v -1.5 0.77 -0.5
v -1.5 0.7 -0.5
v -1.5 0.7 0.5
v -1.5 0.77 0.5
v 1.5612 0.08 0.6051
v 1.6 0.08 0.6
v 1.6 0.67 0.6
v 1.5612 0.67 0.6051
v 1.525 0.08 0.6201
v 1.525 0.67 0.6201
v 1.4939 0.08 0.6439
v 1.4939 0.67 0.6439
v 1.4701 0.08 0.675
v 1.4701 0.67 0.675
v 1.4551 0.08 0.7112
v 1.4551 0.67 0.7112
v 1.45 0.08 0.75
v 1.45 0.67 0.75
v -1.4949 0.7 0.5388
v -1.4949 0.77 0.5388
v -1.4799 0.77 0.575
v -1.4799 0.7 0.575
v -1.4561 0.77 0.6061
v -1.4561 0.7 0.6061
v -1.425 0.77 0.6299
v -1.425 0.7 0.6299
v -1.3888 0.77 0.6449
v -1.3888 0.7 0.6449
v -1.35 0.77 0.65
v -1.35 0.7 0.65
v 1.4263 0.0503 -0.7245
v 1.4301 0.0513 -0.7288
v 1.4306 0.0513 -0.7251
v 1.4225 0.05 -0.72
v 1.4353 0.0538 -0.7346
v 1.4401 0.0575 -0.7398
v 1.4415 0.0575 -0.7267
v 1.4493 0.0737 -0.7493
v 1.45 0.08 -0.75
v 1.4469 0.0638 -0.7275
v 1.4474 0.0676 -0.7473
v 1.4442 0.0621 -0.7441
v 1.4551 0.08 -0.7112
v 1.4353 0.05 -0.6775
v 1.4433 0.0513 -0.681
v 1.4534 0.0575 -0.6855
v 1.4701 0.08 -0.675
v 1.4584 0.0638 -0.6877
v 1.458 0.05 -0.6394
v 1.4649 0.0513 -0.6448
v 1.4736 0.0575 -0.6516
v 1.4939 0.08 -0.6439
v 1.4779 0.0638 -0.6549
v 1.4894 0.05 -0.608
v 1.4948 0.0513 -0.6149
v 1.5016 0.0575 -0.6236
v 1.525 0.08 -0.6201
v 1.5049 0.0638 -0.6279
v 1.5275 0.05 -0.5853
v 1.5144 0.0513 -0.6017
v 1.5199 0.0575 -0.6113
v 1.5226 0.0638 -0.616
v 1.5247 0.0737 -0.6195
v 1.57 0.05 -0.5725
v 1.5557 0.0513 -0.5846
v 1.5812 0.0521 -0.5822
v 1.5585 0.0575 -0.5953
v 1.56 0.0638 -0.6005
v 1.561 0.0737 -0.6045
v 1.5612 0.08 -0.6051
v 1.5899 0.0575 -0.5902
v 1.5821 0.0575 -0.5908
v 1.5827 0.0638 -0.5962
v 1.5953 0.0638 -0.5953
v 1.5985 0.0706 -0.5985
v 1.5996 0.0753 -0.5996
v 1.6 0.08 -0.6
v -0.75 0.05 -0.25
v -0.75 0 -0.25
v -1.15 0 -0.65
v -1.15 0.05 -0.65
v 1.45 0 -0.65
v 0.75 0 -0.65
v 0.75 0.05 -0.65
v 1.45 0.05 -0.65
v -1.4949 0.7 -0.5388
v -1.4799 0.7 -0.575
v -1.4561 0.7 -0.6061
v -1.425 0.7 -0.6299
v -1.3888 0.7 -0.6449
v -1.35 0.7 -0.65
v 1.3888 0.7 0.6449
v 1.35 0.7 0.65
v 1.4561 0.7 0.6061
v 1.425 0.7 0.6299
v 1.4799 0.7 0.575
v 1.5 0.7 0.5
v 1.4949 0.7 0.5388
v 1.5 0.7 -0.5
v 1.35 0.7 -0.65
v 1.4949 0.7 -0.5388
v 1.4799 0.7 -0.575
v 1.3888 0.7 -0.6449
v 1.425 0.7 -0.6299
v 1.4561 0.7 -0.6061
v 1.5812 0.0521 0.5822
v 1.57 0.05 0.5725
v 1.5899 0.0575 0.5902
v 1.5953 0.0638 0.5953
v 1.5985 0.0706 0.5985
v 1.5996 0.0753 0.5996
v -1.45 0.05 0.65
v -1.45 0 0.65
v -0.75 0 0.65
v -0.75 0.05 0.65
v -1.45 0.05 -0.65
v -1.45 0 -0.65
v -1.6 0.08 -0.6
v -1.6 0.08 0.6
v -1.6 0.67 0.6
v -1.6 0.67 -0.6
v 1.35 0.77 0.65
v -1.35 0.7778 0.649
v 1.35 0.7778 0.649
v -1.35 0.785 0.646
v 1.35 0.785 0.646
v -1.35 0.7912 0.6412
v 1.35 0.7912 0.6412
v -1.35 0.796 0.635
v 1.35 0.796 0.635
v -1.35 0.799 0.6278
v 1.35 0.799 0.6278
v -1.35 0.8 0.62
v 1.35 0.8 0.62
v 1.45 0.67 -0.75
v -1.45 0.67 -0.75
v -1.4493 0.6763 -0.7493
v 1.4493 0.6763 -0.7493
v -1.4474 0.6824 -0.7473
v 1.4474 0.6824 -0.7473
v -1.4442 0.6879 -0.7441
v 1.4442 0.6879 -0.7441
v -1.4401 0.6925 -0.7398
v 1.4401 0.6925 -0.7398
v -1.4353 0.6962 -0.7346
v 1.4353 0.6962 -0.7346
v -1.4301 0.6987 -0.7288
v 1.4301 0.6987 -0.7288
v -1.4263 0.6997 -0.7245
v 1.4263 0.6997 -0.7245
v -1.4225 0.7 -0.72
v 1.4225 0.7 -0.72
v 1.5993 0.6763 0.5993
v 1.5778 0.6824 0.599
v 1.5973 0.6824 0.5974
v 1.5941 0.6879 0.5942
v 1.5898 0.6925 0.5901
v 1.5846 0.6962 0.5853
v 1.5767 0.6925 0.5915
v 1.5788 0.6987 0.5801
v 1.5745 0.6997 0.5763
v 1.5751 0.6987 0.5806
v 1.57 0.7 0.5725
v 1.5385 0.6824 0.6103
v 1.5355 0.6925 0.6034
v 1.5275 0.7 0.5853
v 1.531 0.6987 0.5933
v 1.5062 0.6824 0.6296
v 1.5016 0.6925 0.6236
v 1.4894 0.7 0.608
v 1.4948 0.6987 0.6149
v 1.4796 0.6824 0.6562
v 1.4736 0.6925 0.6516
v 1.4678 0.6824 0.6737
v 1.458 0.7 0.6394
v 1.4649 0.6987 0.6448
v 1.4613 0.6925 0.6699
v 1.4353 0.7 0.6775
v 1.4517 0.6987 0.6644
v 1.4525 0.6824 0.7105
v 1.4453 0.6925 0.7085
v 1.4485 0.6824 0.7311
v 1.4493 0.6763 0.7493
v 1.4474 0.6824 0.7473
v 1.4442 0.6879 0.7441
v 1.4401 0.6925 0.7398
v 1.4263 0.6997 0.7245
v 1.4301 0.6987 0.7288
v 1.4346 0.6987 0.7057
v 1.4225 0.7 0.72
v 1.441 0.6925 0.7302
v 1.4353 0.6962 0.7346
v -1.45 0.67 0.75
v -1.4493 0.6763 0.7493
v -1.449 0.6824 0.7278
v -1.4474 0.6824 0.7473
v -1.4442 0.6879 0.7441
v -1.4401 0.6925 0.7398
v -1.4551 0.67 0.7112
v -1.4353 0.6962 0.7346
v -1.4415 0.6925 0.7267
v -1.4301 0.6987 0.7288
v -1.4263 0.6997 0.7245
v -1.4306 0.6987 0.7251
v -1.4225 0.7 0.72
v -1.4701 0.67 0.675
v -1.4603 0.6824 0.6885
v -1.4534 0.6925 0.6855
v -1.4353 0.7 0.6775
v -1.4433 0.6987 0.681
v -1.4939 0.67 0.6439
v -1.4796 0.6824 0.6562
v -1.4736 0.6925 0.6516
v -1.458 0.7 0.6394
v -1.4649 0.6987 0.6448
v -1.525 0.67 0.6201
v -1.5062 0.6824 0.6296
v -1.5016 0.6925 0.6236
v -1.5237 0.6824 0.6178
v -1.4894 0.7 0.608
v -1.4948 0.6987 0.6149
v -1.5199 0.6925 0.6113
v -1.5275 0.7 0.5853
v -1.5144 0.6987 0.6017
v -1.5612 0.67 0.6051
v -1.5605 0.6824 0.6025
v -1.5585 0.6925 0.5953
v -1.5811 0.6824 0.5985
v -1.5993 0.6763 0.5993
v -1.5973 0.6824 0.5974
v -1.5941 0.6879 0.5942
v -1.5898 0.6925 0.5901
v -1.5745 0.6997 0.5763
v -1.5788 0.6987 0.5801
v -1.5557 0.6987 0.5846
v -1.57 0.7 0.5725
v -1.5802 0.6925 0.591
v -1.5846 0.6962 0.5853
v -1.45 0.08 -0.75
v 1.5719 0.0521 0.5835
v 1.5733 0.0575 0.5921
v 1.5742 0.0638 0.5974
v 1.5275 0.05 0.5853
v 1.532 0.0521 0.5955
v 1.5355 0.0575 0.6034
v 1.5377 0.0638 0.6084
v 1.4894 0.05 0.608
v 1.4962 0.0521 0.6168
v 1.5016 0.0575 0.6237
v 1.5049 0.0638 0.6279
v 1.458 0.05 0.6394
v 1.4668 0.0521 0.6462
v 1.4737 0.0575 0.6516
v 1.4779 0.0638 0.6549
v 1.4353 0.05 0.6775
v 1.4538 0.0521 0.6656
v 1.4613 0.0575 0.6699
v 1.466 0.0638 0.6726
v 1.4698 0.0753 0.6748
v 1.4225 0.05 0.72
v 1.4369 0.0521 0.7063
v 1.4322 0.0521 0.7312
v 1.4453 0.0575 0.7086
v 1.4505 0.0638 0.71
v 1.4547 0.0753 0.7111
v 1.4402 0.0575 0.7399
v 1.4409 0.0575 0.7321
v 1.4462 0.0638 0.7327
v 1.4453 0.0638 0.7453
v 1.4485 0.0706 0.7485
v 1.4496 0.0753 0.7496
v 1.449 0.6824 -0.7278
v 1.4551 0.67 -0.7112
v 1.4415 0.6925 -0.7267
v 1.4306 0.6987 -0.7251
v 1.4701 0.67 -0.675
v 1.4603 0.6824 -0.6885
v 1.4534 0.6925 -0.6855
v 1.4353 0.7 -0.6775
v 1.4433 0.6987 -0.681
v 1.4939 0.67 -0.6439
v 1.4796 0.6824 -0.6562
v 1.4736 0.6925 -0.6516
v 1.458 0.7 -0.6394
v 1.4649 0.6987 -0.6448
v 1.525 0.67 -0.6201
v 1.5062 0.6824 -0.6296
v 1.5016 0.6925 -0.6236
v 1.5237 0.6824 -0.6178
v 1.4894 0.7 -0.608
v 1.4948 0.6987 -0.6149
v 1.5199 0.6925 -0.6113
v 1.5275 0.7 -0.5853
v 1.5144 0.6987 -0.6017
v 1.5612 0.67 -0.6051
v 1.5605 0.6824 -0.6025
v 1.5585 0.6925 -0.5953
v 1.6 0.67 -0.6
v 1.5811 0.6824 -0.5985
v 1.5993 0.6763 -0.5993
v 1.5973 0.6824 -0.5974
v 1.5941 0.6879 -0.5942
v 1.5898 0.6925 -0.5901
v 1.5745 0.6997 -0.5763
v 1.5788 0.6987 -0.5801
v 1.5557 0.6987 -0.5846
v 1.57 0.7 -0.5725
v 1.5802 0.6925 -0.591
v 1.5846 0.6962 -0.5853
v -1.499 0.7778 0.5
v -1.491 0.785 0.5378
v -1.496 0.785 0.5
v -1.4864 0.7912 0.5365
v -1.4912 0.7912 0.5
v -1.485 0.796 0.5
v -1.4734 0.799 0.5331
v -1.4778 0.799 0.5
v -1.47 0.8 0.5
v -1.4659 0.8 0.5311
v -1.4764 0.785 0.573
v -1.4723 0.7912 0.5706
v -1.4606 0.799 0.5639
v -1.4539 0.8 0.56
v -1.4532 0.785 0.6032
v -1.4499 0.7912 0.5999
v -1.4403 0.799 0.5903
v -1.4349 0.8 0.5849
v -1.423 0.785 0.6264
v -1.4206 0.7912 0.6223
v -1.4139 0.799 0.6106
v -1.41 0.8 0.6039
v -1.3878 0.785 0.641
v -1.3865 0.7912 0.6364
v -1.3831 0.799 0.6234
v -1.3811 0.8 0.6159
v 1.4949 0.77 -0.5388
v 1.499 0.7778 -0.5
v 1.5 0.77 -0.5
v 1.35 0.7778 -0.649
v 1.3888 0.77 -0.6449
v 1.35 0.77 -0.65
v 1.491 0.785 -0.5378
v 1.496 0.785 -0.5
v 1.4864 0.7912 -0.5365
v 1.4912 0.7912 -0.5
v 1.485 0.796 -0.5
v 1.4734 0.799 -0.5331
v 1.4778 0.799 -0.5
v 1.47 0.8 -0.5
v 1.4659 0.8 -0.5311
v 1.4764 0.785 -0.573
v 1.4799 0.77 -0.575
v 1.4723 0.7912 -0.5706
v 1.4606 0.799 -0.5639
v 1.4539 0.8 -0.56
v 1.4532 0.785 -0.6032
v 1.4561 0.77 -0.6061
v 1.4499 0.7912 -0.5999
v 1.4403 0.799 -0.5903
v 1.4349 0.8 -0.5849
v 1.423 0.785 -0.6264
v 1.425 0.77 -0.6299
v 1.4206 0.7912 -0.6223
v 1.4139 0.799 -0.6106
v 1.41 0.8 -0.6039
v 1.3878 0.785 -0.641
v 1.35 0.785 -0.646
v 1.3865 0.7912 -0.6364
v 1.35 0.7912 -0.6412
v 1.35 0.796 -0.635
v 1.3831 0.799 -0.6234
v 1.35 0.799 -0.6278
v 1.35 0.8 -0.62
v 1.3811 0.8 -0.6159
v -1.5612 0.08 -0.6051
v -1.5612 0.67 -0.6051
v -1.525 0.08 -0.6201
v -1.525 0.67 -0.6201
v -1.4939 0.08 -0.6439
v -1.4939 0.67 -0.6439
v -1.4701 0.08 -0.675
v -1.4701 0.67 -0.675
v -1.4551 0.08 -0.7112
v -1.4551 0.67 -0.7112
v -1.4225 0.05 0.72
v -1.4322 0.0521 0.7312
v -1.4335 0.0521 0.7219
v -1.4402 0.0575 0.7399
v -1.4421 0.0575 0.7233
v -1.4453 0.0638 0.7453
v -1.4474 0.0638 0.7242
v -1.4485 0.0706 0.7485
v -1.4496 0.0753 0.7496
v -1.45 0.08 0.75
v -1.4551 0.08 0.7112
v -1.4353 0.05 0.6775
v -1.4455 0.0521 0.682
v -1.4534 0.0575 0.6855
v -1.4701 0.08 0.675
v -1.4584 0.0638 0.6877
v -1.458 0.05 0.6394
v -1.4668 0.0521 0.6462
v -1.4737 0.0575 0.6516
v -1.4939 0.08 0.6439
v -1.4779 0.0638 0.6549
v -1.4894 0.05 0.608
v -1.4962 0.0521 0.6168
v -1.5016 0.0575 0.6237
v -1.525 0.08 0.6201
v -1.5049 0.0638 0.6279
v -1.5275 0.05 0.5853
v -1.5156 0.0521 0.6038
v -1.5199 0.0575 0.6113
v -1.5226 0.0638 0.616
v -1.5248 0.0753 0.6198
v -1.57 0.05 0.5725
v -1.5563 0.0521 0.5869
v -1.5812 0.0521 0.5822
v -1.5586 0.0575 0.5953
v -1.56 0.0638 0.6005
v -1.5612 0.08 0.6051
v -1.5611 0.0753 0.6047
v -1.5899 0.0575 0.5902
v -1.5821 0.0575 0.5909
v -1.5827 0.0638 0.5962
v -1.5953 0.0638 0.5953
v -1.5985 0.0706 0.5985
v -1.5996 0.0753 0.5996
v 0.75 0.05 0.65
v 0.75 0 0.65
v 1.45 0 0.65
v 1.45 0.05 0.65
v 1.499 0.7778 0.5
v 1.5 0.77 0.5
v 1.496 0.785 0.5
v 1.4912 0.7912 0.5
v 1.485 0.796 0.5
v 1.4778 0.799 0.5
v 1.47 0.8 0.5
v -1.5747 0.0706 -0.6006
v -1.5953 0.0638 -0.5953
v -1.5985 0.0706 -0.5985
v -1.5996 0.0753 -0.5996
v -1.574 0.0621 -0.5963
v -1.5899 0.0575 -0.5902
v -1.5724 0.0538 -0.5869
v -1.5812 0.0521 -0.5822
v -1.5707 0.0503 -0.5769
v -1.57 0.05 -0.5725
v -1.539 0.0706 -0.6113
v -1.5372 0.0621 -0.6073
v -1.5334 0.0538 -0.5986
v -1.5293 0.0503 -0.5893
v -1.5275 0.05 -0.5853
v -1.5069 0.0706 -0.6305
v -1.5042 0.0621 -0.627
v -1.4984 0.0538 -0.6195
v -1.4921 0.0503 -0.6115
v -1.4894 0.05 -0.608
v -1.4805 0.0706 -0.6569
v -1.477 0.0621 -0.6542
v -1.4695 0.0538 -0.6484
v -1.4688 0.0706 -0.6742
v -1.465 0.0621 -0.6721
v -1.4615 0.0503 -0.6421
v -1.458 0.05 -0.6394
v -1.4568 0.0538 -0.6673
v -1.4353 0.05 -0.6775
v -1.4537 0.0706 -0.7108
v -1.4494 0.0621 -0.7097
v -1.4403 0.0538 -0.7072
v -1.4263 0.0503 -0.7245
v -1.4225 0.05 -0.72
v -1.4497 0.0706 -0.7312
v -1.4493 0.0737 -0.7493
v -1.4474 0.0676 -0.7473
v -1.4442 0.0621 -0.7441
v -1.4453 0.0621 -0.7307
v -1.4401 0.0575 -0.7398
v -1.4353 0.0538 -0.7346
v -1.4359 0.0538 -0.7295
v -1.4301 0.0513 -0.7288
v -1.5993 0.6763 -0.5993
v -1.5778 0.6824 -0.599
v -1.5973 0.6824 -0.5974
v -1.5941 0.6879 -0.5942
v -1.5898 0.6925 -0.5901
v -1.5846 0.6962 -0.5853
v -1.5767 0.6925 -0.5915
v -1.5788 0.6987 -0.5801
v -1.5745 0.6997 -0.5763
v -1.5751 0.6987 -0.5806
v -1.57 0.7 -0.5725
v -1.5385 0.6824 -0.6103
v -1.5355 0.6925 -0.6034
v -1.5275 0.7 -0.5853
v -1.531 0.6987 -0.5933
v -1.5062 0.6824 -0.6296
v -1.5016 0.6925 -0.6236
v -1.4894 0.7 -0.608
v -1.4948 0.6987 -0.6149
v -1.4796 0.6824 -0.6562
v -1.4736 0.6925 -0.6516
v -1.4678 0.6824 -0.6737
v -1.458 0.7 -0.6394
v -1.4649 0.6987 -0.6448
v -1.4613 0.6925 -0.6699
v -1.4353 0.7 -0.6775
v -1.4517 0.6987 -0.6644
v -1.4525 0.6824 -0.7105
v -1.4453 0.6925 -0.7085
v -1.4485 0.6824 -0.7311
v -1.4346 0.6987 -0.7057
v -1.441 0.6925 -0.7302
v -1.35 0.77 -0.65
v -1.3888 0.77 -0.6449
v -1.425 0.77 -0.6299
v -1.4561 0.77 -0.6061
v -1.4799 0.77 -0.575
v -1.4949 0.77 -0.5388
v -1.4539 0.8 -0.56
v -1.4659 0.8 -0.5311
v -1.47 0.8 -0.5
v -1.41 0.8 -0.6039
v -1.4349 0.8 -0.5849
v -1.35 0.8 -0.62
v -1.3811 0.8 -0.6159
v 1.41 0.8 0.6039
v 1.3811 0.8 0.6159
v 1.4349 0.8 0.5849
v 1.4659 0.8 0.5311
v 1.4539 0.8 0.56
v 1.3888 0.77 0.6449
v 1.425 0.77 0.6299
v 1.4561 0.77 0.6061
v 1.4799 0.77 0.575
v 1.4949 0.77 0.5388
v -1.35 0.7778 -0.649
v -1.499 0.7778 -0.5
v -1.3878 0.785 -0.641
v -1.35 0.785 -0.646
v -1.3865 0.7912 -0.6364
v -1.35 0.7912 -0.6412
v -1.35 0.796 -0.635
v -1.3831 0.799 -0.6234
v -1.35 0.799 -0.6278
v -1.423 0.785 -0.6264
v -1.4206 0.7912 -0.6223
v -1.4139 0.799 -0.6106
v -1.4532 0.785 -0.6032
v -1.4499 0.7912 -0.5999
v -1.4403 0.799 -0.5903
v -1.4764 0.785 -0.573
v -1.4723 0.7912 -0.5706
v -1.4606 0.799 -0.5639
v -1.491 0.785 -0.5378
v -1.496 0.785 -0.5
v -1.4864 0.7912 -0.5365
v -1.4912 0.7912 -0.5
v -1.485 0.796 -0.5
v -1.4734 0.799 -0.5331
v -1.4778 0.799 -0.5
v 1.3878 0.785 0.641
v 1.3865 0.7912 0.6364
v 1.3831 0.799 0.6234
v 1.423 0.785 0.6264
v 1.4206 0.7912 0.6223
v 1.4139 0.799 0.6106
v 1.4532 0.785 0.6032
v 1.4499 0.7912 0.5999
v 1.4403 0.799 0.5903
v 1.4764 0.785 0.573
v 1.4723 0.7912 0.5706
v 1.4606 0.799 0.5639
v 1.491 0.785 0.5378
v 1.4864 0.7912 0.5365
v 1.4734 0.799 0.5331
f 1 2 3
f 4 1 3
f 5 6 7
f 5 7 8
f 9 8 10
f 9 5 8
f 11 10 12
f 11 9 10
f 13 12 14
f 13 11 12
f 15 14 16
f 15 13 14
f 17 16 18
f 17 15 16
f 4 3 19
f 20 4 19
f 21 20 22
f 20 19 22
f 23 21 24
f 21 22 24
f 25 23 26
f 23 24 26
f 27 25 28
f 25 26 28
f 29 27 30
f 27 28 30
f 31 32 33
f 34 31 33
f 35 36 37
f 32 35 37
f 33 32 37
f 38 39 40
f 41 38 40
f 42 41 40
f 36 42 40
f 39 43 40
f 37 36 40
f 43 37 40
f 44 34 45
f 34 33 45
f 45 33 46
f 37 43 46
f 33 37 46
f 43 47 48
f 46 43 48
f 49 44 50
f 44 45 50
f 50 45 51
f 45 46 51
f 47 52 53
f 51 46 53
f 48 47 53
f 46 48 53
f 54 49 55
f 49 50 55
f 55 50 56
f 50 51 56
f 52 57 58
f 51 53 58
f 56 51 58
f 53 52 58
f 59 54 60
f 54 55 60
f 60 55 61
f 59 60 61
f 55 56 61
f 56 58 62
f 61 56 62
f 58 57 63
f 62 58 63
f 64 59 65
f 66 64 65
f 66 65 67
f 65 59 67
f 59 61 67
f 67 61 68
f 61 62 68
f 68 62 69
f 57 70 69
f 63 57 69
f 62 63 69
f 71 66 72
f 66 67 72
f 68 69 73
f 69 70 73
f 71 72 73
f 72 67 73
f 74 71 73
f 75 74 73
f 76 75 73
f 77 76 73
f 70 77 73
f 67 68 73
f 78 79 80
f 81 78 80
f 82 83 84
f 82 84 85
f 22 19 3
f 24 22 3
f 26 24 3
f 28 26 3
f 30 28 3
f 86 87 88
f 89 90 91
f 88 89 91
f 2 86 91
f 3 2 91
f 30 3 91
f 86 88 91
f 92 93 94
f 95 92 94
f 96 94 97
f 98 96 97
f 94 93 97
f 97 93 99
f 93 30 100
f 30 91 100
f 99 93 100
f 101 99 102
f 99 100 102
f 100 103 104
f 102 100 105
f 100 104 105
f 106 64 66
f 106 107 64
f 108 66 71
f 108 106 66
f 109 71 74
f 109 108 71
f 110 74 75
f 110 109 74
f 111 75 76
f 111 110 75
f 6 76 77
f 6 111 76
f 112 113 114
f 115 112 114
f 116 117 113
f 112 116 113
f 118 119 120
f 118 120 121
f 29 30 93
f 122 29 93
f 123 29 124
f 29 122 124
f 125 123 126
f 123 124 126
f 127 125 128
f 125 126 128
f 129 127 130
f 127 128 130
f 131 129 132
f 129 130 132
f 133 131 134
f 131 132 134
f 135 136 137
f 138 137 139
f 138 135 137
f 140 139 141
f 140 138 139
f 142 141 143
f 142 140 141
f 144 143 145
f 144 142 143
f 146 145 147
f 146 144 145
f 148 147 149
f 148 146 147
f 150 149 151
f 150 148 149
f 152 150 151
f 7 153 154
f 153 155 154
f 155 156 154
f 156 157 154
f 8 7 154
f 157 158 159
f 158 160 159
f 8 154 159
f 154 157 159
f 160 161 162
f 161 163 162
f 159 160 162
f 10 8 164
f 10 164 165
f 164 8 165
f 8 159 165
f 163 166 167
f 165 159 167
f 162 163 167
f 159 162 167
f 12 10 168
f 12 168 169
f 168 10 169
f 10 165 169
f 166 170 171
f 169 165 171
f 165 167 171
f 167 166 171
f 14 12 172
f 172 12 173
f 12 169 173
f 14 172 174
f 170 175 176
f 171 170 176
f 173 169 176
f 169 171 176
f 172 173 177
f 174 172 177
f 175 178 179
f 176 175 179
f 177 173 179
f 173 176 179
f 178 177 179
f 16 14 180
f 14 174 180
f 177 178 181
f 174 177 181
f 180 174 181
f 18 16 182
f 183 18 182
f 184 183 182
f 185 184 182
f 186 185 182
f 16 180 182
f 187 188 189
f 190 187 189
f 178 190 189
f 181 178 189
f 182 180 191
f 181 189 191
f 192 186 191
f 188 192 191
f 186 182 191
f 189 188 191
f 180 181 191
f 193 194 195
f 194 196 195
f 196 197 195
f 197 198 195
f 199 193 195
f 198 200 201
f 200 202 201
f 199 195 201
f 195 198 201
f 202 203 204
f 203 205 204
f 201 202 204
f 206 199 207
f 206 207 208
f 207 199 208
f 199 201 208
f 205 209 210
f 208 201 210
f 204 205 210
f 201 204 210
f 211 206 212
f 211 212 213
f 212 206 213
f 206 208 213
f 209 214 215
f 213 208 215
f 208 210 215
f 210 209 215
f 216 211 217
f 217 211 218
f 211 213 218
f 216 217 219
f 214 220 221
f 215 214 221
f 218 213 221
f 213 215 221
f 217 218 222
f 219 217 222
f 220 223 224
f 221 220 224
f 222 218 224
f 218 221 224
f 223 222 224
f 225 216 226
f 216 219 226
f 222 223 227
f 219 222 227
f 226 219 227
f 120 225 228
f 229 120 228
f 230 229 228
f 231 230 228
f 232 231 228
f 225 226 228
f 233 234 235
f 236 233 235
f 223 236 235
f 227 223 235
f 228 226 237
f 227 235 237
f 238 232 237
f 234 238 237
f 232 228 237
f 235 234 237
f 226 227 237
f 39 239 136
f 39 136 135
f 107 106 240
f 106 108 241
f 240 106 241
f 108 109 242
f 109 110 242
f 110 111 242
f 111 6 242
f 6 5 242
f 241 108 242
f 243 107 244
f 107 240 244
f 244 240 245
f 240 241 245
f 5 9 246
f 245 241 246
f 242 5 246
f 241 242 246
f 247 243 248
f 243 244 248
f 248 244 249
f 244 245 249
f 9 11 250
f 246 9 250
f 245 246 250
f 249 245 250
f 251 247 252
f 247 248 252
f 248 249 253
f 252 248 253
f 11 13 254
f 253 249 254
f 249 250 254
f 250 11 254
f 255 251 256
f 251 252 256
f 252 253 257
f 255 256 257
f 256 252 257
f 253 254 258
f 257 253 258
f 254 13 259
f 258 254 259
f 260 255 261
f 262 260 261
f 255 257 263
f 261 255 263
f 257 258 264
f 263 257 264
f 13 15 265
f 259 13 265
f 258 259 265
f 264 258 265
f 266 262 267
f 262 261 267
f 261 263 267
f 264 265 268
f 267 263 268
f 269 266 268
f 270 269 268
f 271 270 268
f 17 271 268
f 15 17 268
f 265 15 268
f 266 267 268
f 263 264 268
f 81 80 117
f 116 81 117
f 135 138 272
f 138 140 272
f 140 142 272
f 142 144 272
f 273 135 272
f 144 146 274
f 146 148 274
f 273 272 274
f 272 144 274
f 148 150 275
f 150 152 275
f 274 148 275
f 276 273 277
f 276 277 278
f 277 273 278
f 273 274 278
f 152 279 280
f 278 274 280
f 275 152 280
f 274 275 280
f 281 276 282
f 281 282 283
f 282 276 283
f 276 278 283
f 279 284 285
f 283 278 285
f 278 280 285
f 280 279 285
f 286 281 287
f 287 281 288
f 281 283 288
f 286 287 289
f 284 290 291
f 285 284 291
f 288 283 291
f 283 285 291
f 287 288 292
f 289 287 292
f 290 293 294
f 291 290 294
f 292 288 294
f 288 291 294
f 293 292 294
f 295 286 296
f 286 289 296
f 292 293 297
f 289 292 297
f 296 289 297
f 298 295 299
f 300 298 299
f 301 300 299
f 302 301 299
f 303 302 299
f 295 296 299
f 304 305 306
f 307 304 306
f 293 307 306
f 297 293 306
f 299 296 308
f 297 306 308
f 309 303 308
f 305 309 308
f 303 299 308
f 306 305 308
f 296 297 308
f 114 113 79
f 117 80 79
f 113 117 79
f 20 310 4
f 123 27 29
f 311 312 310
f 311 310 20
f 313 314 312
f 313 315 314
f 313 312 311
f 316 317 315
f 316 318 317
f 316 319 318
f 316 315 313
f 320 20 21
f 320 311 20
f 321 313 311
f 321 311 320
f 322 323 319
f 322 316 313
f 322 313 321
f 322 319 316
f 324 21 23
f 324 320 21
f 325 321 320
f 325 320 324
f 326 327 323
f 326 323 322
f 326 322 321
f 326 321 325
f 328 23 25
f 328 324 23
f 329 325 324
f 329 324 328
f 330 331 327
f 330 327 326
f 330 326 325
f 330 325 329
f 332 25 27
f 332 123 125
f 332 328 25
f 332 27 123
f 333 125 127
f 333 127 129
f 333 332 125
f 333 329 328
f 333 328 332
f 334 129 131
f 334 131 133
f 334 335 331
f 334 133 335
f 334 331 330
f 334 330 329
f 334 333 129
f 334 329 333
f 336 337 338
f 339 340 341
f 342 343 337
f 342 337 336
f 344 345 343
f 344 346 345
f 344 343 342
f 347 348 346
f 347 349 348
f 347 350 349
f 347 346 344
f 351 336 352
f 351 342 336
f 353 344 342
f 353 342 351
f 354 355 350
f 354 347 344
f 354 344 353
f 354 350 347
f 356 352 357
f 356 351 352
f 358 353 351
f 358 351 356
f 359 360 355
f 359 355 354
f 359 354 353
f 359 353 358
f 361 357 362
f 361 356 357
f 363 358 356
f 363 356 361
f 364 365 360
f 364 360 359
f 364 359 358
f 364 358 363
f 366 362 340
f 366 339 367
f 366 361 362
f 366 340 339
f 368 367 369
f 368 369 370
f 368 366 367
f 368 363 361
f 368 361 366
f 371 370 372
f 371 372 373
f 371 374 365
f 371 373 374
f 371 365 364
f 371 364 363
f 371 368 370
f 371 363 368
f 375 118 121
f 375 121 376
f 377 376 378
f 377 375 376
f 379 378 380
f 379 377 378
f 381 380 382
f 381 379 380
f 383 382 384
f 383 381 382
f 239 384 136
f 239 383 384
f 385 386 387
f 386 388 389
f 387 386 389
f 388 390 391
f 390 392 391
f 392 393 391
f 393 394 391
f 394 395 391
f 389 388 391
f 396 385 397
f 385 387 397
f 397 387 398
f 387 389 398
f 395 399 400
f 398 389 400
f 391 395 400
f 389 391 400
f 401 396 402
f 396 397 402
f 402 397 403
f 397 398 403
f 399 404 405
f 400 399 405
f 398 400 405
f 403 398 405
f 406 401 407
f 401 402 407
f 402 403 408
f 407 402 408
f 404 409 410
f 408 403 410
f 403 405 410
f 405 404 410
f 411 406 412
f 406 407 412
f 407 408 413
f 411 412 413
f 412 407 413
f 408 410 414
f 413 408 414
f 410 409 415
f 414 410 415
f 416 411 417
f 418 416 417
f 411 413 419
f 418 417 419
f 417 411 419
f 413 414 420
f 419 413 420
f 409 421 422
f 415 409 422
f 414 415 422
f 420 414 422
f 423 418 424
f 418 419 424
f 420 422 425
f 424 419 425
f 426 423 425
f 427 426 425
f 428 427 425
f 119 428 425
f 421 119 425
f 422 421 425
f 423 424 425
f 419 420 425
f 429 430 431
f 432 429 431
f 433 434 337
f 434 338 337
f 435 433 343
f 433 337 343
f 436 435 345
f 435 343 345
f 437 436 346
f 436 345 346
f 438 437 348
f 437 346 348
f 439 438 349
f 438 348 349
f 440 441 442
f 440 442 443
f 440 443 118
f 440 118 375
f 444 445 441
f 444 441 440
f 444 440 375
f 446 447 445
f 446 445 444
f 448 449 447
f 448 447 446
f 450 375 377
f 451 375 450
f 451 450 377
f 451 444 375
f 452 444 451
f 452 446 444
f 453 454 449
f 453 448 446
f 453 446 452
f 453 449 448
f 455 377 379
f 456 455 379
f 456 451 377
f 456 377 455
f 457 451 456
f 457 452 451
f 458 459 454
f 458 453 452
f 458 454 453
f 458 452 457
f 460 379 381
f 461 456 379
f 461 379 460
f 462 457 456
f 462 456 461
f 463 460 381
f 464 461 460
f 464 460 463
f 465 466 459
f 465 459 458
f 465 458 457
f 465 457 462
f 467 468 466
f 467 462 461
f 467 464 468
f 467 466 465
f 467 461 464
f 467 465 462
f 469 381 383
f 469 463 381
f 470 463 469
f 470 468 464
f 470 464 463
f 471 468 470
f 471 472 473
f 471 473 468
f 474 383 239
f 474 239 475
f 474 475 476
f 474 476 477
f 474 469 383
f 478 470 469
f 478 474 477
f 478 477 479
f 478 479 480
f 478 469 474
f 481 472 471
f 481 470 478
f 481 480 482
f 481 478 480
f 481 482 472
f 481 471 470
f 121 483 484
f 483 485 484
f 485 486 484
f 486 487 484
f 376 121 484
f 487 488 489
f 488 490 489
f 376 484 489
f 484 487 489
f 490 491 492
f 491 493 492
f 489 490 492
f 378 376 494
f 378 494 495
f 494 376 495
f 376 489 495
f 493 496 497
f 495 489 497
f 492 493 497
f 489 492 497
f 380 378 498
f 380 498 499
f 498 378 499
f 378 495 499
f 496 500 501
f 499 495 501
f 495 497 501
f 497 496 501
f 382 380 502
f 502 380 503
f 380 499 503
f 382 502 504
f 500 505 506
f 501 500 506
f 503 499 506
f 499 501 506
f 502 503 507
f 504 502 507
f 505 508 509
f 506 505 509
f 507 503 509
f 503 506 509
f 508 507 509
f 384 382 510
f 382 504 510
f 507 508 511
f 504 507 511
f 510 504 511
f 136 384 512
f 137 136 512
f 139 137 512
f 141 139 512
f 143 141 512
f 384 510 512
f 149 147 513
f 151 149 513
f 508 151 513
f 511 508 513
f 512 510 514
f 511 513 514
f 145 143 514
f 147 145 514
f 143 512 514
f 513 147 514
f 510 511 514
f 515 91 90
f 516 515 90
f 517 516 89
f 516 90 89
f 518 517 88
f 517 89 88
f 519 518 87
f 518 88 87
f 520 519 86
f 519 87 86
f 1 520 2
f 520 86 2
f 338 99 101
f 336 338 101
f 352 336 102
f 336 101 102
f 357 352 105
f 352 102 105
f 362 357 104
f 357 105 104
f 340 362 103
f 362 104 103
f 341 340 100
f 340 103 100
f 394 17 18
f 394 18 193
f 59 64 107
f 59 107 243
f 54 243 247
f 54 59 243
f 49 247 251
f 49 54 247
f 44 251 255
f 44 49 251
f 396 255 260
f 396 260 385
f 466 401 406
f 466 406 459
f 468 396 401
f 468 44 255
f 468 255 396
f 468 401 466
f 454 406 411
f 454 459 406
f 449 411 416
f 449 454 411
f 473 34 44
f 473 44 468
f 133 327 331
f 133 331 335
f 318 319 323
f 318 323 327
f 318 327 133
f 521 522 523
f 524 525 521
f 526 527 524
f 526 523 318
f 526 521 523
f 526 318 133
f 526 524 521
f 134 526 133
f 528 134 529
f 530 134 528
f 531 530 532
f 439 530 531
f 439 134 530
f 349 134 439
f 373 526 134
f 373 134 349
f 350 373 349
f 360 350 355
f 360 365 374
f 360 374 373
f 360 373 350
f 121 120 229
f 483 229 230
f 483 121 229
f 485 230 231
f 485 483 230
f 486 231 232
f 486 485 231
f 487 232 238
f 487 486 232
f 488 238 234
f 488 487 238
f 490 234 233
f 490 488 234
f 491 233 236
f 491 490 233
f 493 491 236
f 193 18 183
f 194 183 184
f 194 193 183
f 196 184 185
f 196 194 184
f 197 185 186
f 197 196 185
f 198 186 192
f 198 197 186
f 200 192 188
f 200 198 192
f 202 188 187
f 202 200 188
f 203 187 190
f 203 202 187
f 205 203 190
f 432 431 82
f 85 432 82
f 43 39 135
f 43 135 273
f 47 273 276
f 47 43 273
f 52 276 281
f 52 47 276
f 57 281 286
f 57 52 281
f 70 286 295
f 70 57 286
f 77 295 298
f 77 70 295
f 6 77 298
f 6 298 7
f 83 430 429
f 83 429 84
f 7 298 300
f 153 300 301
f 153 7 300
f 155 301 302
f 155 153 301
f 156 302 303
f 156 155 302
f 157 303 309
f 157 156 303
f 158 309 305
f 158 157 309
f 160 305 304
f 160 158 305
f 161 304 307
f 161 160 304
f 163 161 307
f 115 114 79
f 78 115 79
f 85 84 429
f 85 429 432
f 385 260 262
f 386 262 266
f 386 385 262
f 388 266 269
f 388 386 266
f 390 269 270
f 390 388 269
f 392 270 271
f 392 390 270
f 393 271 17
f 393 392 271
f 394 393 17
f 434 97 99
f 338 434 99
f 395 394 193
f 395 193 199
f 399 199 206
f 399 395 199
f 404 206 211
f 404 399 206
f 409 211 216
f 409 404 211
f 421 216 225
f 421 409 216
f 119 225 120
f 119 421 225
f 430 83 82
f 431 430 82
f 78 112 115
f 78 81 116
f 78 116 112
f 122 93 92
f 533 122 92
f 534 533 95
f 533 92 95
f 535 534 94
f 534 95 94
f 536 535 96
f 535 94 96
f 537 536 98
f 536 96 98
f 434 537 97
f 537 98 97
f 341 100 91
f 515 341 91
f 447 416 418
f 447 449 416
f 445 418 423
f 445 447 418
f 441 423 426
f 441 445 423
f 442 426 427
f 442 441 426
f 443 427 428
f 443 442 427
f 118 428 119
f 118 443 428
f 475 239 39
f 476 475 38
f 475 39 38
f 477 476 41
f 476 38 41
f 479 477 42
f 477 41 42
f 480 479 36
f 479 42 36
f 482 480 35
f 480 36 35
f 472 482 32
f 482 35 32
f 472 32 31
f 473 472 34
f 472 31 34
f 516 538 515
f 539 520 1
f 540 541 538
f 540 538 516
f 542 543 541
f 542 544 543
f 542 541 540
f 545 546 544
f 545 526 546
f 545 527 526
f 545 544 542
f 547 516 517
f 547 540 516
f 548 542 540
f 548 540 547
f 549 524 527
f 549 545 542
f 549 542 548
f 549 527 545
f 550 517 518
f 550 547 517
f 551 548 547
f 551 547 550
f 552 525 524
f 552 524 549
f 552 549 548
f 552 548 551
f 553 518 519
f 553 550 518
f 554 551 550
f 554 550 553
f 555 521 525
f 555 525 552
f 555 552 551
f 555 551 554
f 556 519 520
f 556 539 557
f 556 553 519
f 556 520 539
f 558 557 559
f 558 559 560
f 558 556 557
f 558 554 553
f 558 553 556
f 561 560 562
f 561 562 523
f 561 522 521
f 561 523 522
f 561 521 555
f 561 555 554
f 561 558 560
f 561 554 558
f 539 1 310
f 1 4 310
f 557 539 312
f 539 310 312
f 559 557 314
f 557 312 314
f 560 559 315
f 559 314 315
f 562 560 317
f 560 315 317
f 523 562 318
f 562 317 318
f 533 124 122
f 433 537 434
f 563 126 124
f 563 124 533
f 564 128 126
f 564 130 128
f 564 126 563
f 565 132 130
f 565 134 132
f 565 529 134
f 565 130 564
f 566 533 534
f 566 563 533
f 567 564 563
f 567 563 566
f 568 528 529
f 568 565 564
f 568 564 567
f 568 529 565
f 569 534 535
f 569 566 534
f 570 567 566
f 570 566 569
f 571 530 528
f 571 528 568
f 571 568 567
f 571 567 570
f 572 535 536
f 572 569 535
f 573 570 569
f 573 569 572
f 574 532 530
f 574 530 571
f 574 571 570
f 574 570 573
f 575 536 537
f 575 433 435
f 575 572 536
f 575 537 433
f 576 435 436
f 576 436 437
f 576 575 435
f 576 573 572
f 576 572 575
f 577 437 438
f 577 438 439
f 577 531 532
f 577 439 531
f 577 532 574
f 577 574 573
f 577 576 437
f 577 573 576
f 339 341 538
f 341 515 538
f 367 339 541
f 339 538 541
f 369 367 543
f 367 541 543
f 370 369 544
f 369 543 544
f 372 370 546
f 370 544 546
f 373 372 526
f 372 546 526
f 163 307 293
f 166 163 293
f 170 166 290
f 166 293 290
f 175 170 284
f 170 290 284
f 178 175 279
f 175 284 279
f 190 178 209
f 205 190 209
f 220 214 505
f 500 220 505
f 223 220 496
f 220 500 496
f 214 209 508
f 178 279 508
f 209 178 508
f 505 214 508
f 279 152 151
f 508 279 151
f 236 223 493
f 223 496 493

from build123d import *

# Parameters (mm, degrees)
EXTRUDE_START     = 0.05
EXTRUDE_1_DEPTH   = 0.65
EXTRUDE_2_DEPTH   = 0.1
FILLET_1_R        = 0.03
FILLET_2_R        = 0.03
FILLET_3_R        = 0.03
EXTRUDE_3_DEPTH   = 0.05
SKETCH_3_W        = 0.7
SKETCH_3_H        = 1.3
EXTRUDE_3_2_DEPTH = 0.05


with BuildPart() as part:
    # Эскиз1 → Бобышка-Вытянуть1 (new body)
    with BuildSketch(Plane(origin=(0, 0, 0), x_dir=(1, 0, 0), z_dir=(0, 1, 0)).offset(EXTRUDE_START)):
        with BuildLine():
            Line((-1.45, 0.75), (1.45, 0.75))
            ThreePointArc((1.45, 0.75), (1.493933983, 0.643933983), (1.6, 0.6))
            Line((1.6, 0.6), (1.6, -0.6))
            ThreePointArc((1.6, -0.6), (1.493933983, -0.643933983), (1.45, -0.75))
            Line((1.45, -0.75), (-1.45, -0.75))
            ThreePointArc((-1.45, -0.75), (-1.493933983, -0.643933983), (-1.6, -0.6))
            Line((-1.6, -0.6), (-1.6, 0.6))
            ThreePointArc((-1.6, 0.6), (-1.493933983, 0.643933983), (-1.45, 0.75))
        make_face()
    extrude(amount=EXTRUDE_1_DEPTH)

    # Скругление1
    fillet_1_edges = [part.edges().sort_by_distance(p)[0] for p in [
        (-1.493933983, 0.7, 0.643933983),
        (0, 0.7, 0.75),
        (1.493933983, 0.7, 0.643933983),
        (1.6, 0.7, 0),
        (1.493933983, 0.7, -0.643933983),
        (0, 0.7, -0.75),
        (-1.493933983, 0.7, -0.643933983),
        (-1.6, 0.7, 0),
    ]]
    fillet(fillet_1_edges, radius=FILLET_1_R)

    # Скругление2
    fillet_2_edges = [part.edges().sort_by_distance(p)[0] for p in [
        (-1.6, 0.05, 0),
        (-1.493933983, 0.05, -0.643933983),
        (0, 0.05, -0.75),
        (1.493933983, 0.05, -0.643933983),
        (1.6, 0.05, 0),
        (1.493933983, 0.05, 0.643933983),
        (0, 0.05, 0.75),
        (-1.493933983, 0.05, 0.643933983),
    ]]
    fillet(fillet_2_edges, radius=FILLET_2_R)


with BuildPart() as body_2:
    # Эскиз2 → Бобышка-Вытянуть2 (new body)
    with BuildSketch(Plane(origin=(0, 0.7, 0), x_dir=(1, 0, 0), z_dir=(0, 1, 0))):
        with BuildLine():
            Line((-1.35, -0.65), (1.35, -0.65))
            ThreePointArc((1.35, -0.65), (1.456066017, -0.606066017), (1.5, -0.5))
            Line((1.5, -0.5), (1.5, 0.5))
            ThreePointArc((1.5, 0.5), (1.456066017, 0.606066017), (1.35, 0.65))
            Line((1.35, 0.65), (-1.35, 0.65))
            ThreePointArc((-1.35, 0.65), (-1.456066017, 0.606066017), (-1.5, 0.5))
            Line((-1.5, 0.5), (-1.5, -0.5))
            ThreePointArc((-1.5, -0.5), (-1.456066017, -0.606066017), (-1.35, -0.65))
        make_face()
    extrude(amount=EXTRUDE_2_DEPTH)

    # Скругление3
    fillet_3_edges = [body_2.edges().sort_by_distance(p)[0] for p in [
        (-1.456066017, 0.8, -0.606066017),
        (-1.5, 0.8, 0),
        (-1.456066017, 0.8, 0.606066017),
        (0, 0.8, 0.65),
        (1.456066017, 0.8, 0.606066017),
        (1.5, 0.8, 0),
        (1.456066017, 0.8, -0.606066017),
        (0, 0.8, -0.65),
    ]]
    fillet(fillet_3_edges, radius=FILLET_3_R)


with BuildPart() as body_3:
    # Эскиз3 → Бобышка-Вытянуть3 (new body)
    with BuildSketch(Plane(origin=(0, 0, 0), x_dir=(1, 0, 0), z_dir=(0, 1, 0))):
        Polygon((-1.45, -0.65), (-0.75, -0.65), (-0.75, 0.25), (-1.15, 0.65), (-1.45, 0.65), align=None)
    extrude(amount=EXTRUDE_3_DEPTH)


with BuildPart() as body_4:
    # Эскиз3 → Extrude 3 2 (new body)
    with BuildSketch(Plane(origin=(0, 0, 0), x_dir=(1, 0, 0), z_dir=(0, 1, 0))):
        with Locations((1.1, 0)):
            Rectangle(SKETCH_3_W, SKETCH_3_H)
    extrude(amount=EXTRUDE_3_2_DEPTH)


solid = Compound([part.part, body_2.part, body_3.part, body_4.part])
